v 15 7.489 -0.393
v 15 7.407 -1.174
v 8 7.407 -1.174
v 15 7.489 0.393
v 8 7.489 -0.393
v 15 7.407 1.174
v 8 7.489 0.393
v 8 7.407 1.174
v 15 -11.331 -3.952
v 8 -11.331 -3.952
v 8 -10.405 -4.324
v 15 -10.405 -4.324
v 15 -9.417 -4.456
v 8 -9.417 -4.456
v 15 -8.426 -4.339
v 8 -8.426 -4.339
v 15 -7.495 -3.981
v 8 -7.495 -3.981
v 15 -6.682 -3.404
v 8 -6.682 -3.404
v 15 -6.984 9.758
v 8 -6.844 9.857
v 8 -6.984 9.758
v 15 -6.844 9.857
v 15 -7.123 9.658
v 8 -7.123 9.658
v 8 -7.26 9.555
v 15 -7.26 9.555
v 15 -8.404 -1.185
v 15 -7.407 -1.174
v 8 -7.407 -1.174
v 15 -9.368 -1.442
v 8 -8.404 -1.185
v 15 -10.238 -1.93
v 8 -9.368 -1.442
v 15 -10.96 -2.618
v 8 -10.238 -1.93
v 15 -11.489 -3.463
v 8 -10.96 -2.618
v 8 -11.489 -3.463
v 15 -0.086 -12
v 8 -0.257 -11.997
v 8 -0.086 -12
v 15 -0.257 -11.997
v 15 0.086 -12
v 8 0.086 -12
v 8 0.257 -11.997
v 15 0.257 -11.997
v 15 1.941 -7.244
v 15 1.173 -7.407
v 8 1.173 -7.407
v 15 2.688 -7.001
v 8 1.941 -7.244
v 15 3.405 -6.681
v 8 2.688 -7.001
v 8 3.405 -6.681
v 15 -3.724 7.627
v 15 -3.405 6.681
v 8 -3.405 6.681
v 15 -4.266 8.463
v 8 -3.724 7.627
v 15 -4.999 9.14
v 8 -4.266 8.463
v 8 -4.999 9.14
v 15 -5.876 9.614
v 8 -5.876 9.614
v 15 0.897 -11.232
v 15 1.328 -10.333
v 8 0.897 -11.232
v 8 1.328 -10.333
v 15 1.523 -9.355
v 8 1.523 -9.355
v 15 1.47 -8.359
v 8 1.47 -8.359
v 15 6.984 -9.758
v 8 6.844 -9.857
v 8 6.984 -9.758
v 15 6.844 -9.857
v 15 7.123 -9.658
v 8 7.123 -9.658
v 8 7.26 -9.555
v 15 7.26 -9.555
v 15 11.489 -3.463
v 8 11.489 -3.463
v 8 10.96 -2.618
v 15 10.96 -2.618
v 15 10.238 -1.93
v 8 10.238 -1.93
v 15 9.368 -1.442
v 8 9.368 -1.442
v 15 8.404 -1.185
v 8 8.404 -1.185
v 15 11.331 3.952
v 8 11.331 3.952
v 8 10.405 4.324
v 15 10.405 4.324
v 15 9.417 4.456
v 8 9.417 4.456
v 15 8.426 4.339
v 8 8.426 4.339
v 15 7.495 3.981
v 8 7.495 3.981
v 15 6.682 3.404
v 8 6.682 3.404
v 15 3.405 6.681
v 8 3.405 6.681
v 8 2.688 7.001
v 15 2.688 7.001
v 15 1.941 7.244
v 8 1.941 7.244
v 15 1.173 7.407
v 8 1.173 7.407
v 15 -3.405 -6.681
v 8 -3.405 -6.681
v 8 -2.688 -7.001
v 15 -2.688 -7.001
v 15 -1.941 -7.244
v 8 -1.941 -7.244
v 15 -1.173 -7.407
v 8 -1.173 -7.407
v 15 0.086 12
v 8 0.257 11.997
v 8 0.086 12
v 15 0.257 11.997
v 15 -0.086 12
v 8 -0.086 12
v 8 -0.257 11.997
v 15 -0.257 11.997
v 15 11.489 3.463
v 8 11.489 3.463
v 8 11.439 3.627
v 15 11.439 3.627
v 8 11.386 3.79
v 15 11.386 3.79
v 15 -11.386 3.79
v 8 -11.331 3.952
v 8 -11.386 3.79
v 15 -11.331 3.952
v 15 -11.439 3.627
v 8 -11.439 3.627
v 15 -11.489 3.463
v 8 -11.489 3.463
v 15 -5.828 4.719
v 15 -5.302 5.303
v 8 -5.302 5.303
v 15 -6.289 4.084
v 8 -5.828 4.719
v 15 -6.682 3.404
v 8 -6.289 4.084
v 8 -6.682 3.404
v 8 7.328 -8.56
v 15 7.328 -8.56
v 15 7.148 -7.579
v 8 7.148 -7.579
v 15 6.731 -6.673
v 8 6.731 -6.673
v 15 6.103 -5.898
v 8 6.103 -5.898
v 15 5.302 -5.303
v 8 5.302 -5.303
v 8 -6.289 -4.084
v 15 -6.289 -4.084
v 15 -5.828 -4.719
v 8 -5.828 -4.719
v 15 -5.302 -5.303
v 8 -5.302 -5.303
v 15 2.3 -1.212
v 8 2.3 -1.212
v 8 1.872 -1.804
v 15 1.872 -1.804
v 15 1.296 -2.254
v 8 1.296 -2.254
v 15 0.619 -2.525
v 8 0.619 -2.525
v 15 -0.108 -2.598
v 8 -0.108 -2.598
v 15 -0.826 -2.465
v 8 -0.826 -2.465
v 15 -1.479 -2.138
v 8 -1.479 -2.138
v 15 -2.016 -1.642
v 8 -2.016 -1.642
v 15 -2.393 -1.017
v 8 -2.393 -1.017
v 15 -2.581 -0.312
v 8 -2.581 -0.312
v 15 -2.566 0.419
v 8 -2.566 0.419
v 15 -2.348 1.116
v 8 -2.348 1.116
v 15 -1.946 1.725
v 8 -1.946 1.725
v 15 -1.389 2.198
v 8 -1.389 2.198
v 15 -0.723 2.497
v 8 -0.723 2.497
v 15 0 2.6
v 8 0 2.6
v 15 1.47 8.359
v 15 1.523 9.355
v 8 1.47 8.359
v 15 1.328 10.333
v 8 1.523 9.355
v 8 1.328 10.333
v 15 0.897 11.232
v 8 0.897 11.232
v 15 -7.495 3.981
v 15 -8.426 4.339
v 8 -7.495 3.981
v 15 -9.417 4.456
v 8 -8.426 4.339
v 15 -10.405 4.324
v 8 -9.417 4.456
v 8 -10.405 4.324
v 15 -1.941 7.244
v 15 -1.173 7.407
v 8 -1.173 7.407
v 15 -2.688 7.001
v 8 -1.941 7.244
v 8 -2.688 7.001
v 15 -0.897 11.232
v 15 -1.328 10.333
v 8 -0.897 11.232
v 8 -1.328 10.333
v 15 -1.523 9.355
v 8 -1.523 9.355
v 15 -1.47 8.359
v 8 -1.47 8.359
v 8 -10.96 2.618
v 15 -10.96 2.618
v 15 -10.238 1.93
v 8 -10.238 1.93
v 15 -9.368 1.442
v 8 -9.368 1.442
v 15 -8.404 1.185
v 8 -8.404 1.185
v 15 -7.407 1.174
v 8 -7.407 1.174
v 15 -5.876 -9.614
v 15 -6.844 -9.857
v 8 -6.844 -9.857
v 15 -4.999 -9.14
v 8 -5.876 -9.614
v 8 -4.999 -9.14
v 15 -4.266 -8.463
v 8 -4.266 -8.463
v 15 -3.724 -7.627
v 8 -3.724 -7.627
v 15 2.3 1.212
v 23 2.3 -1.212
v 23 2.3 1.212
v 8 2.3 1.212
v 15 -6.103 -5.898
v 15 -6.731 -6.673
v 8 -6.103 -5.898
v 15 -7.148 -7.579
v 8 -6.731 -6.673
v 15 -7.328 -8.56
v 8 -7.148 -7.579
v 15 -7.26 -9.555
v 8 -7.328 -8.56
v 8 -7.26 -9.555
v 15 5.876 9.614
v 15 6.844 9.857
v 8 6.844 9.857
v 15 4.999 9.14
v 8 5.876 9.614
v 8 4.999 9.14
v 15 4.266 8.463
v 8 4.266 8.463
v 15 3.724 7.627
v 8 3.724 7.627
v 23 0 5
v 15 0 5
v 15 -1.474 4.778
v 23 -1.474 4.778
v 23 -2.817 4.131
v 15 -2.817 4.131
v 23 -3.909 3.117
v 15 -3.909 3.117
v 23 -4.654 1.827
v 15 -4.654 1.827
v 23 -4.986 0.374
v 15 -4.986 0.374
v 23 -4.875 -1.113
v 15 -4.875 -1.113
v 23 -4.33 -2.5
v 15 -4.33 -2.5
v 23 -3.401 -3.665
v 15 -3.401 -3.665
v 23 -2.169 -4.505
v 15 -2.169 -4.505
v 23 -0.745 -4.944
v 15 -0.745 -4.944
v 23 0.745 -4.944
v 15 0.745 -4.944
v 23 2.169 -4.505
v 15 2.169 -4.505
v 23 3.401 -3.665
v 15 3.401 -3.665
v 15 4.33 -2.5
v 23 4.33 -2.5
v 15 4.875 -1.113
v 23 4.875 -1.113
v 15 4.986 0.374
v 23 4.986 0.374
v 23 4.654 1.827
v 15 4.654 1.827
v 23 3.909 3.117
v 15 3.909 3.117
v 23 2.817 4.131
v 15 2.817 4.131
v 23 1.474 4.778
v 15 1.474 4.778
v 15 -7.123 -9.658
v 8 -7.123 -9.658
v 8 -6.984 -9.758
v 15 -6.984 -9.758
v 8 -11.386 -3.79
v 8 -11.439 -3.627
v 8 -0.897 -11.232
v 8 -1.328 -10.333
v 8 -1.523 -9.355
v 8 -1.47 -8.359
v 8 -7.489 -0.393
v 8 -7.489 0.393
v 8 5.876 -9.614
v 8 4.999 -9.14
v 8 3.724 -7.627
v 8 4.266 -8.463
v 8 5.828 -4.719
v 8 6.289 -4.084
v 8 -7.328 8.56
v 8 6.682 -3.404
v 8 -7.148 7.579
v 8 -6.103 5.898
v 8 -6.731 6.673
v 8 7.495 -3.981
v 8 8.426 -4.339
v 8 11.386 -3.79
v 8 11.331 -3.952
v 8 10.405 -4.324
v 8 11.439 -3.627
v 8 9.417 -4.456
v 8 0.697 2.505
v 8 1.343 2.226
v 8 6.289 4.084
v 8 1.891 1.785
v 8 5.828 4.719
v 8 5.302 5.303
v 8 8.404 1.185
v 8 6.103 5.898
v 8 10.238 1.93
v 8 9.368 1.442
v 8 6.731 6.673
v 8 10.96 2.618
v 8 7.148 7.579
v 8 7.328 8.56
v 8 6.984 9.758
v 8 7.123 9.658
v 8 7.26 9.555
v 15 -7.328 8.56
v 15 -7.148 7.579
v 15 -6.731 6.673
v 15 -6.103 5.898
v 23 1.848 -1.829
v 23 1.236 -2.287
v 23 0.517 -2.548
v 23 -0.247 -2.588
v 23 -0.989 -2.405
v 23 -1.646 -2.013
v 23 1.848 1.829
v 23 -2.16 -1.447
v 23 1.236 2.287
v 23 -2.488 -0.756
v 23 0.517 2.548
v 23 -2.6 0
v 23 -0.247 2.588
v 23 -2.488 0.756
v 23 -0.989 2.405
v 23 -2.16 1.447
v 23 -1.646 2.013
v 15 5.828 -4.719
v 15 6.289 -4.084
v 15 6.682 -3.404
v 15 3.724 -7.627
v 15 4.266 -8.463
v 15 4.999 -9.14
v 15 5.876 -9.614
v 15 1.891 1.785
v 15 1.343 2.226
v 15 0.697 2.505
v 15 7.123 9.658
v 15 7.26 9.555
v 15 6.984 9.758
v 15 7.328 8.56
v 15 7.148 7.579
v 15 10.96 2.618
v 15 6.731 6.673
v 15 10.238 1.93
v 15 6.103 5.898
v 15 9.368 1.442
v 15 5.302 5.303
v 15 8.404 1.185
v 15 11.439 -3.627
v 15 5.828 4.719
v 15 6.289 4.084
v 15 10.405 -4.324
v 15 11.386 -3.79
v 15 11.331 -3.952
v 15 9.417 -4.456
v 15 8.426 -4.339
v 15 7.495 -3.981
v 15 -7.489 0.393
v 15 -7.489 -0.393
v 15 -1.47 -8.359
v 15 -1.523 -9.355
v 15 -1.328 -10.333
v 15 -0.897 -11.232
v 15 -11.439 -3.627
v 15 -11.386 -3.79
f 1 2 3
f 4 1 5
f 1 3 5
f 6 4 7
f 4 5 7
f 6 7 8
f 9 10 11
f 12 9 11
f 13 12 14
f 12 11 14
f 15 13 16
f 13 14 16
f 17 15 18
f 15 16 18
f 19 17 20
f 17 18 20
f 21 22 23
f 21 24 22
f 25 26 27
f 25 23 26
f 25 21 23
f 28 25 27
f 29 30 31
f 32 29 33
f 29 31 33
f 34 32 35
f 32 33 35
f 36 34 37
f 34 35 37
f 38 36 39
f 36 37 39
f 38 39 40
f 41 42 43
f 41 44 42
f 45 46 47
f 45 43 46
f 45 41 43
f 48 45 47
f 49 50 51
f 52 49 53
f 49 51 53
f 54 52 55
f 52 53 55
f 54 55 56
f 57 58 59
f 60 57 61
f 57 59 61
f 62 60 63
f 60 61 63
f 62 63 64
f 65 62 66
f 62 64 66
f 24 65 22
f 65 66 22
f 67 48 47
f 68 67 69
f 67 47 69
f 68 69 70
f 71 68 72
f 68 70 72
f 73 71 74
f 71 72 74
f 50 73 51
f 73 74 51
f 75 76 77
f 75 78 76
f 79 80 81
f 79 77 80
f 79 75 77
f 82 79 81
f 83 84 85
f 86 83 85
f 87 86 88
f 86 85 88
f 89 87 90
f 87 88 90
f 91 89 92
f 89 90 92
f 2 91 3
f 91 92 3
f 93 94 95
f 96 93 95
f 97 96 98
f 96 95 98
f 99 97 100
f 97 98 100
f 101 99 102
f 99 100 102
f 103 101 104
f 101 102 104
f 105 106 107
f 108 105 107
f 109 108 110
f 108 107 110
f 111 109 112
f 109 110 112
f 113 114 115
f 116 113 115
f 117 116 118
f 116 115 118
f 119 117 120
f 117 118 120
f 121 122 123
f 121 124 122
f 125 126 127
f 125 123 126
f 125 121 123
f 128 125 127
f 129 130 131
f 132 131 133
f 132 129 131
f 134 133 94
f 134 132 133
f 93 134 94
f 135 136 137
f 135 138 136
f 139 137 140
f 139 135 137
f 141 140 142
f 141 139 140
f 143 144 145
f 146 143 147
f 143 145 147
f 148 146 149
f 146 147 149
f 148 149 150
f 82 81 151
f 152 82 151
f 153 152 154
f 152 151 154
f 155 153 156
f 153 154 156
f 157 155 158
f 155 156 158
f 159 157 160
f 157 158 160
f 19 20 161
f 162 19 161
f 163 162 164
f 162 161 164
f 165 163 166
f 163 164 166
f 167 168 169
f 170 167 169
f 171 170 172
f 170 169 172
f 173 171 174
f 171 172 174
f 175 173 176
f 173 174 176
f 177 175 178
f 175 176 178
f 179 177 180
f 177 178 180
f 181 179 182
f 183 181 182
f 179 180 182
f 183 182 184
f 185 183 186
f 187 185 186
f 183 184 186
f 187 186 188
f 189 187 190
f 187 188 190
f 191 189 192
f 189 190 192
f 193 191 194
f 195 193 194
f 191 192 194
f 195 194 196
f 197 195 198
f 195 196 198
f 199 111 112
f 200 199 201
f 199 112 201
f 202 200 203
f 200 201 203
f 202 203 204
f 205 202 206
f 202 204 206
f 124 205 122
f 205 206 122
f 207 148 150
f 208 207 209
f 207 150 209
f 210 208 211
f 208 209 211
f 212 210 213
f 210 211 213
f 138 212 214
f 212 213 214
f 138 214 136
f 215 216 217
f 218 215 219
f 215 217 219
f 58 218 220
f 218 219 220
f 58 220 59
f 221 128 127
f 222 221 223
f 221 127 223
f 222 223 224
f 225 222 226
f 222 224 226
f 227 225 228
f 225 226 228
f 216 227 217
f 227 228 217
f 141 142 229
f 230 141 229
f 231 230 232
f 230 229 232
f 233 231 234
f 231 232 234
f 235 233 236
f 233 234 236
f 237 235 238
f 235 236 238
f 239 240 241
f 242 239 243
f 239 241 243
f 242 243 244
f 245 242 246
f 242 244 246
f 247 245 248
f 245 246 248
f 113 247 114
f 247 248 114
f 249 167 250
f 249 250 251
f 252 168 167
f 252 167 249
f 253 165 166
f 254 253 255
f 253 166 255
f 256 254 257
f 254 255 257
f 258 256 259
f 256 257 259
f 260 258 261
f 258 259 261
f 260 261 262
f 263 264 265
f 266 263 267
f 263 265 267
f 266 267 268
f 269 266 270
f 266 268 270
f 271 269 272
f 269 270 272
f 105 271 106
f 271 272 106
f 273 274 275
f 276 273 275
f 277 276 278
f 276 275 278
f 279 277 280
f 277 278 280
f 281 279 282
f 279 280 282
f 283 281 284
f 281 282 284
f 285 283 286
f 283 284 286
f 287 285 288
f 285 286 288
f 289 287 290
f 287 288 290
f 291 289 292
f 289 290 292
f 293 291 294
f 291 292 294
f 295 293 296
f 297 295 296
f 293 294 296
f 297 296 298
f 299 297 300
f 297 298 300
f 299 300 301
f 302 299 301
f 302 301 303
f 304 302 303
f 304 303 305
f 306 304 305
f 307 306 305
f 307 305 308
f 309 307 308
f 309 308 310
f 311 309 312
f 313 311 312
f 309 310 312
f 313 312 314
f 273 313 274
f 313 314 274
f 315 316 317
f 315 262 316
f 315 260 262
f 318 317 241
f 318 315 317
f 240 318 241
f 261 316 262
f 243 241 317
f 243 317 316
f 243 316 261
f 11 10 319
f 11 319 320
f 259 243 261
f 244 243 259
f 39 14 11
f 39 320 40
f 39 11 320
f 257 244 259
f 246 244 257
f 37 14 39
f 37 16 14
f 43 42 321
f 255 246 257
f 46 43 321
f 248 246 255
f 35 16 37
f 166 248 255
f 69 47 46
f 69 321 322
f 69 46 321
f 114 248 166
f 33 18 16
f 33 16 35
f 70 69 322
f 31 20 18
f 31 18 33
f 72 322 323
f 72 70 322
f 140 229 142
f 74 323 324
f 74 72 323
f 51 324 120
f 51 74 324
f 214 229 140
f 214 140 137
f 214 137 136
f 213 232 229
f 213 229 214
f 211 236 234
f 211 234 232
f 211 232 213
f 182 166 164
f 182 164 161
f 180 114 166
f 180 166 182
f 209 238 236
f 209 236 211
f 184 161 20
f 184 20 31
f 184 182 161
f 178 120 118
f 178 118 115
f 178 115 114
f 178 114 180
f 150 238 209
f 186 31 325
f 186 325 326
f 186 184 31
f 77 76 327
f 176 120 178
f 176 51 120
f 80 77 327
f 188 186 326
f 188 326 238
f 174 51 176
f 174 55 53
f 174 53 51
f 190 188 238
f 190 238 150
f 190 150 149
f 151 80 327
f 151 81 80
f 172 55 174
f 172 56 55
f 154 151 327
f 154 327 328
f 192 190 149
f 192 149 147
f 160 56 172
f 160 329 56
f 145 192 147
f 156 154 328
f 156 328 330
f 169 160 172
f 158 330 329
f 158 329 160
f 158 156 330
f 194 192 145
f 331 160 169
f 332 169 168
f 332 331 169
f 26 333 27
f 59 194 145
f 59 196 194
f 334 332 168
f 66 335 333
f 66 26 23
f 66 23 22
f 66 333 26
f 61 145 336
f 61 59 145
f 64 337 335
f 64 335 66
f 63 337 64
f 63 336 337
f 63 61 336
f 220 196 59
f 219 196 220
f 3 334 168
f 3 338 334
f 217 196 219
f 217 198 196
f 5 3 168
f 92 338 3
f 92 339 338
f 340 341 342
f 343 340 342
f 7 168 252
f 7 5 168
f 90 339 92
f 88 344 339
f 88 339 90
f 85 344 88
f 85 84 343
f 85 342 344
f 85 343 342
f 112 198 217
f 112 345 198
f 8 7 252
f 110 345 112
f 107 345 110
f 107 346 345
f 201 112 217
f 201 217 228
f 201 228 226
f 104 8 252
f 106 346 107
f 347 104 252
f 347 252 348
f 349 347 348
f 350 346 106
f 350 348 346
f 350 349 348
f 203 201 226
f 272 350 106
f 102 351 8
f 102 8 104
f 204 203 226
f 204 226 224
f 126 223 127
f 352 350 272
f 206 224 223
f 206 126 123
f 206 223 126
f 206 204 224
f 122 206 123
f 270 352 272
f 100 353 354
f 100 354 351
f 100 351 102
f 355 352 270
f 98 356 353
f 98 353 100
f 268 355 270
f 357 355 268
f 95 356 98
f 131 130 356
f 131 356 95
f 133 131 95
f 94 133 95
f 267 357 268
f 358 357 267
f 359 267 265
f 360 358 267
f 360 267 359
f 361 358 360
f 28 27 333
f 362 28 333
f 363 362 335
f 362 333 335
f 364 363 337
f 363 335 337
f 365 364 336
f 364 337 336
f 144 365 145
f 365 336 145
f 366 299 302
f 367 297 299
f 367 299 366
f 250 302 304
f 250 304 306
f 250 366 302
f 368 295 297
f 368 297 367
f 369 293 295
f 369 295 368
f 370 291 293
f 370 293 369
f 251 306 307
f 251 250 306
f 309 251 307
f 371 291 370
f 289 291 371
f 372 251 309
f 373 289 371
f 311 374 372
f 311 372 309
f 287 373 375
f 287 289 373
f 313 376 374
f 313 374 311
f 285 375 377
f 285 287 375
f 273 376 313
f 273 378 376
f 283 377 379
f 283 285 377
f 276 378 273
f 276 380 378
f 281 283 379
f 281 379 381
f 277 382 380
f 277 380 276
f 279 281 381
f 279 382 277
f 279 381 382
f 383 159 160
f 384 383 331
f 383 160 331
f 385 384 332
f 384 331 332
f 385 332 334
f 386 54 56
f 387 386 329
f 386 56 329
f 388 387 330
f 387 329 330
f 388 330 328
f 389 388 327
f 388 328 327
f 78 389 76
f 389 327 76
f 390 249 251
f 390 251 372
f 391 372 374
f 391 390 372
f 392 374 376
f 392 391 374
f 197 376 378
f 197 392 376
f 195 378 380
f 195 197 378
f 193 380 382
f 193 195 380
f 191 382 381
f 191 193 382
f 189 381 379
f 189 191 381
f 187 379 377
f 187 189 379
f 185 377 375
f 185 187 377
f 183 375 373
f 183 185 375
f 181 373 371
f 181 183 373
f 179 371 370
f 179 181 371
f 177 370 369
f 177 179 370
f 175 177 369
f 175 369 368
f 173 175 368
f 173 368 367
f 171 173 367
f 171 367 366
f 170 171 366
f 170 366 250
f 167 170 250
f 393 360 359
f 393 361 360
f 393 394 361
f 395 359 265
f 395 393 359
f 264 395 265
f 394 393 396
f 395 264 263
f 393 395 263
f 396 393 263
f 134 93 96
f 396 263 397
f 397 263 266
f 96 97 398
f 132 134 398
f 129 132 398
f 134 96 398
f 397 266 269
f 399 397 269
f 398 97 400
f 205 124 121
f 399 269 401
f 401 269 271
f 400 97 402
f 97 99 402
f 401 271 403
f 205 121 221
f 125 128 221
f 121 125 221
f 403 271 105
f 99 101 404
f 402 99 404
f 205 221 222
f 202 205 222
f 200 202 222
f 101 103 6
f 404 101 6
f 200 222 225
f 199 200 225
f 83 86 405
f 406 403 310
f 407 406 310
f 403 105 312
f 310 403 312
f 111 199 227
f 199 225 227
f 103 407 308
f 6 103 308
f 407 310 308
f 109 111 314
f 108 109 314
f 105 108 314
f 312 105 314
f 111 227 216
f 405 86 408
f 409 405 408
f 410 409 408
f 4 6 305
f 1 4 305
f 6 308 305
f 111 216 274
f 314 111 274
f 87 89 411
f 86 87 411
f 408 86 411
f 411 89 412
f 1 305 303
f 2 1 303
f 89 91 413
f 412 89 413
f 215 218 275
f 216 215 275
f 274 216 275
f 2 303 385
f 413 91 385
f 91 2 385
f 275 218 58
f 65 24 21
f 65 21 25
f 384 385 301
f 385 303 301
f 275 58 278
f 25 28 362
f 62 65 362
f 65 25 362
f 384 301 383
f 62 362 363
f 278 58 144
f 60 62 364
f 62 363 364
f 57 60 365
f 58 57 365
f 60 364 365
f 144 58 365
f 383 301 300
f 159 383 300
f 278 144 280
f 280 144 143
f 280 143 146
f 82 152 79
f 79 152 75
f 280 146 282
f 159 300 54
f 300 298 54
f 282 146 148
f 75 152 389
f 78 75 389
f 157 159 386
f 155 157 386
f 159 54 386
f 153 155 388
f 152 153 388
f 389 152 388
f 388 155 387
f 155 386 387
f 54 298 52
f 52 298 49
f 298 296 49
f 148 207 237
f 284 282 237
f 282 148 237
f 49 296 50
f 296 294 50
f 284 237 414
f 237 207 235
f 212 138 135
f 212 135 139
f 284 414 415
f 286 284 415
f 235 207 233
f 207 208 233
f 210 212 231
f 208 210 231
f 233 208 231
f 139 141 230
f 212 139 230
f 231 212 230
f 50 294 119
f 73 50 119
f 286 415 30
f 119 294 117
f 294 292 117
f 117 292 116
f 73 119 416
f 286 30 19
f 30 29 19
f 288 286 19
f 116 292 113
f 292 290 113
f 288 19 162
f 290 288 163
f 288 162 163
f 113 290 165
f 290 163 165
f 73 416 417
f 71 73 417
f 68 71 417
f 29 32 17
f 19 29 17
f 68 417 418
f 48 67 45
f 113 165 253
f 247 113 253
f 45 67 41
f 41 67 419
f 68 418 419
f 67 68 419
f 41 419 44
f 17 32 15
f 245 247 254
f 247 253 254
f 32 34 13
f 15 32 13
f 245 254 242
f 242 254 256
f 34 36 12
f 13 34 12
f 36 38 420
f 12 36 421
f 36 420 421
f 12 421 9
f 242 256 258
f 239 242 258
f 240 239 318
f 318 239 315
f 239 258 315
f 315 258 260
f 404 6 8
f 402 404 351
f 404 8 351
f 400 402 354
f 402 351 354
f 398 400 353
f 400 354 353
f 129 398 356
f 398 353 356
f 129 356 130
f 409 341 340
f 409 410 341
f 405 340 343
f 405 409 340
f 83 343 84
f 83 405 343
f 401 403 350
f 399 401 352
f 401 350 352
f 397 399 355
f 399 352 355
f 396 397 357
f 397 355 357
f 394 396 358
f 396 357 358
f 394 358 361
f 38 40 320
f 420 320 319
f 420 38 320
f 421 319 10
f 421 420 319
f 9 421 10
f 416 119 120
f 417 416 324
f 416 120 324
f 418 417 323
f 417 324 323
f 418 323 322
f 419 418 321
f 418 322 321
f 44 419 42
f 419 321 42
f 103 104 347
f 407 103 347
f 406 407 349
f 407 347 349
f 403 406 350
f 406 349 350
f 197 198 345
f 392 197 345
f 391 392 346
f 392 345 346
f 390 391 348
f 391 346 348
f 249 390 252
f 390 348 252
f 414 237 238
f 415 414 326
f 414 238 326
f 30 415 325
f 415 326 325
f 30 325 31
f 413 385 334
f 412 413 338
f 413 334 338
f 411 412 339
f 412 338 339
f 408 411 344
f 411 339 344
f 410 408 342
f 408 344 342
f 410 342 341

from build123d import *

# Parameters (mm, degrees)
BASPROSKE_W         = 15
BASPROSKE_H         = 12
TOOTHCUT_DEPTH      = 23.649503306
TEETHCUTS_COUNT     = 10
TEETHCUTS_ANGLE     = 324
BORSKE_R            = 0.45
BORE_DEPTH          = 50.0000508
SKETCH1_R           = 0.45
CUT_EXTRUDE1_DEPTH  = 15
CUT_EXTRUDE2_DEPTH  = 8
SKETCH6_R           = 5
BOSS_EXTRUDE1_DEPTH = 8


with BuildPart() as part:
    # BasProSke → Base-Revolve (revolve)
    with BuildSketch(Plane(origin=(0, 0, 0), x_dir=(1, 0, 0), z_dir=(0, 1, 0)), mode=Mode.PRIVATE) as base_revolve_sk:
        with Locations((7.5, 6)):
            Rectangle(BASPROSKE_W, BASPROSKE_H)
    revolve(base_revolve_sk.sketch.rotate(Axis((-10, 0, 0), (1, 0, 0)), 180), axis=Axis((-10, 0, 0), (1, 0, 0)))

    # TooCutSke → ToothCut (cut, through all)
    with BuildSketch(Plane(origin=(0, 0, 0), x_dir=(0, 0, -1), z_dir=(1, 0, 0))):
        with BuildLine():
            ThreePointArc((1.173662691, 7.406586048), (0, 7.499), (-1.173662691, 7.406586048))
            ThreePointArc((-1.173662691, 7.406586048), (-1.668191438, 9.834565786), (-3.497907776, 11.50542856))
            ThreePointArc((-3.497907776, 11.50542856), (0, 12.0254), (3.497907776, 11.50542856))
            ThreePointArc((3.497907776, 11.50542856), (1.668191438, 9.834565786), (1.173662691, 7.406586048))
        make_face()
    toothcut = extrude(amount=TOOTHCUT_DEPTH, mode=Mode.SUBTRACT)

    # TeethCuts: ToothCut ×10 about axis
    teethcuts_axis = Axis((-10, 0, 0), (1, 0, 0))
    for i in range(1, TEETHCUTS_COUNT):
        add(toothcut.rotate(teethcuts_axis, i * TEETHCUTS_ANGLE / (TEETHCUTS_COUNT - 1)), mode=Mode.SUBTRACT)

    # BorSke → Bore (cut, symmetric)
    with BuildSketch(Plane(origin=(0, 0, 0), x_dir=(0, 0, -1), z_dir=(1, 0, 0))):
        with Locations(Location((0, 0, 0), (0, 0, 180))):
            Circle(BORSKE_R)
    extrude(amount=BORE_DEPTH, both=True, mode=Mode.SUBTRACT)

    # Sketch1 → Cut-Extrude1 (cut)
    with BuildSketch(Plane.ZY):
        with BuildLine():
            Line((1.212435565, 2.3), (-1.212435565, 2.3))
            ThreePointArc((-1.212435565, 2.3), (-1.343068786, -2.226244873), (2.6, 0))
            ThreePointArc((2.6, 0), (2.226244873, 1.343068786), (1.212435565, 2.3))
        make_face()
        Circle(SKETCH1_R, mode=Mode.SUBTRACT)
    extrude(amount=-CUT_EXTRUDE1_DEPTH, mode=Mode.SUBTRACT)

    # Sketch5 → Cut-Extrude2 (cut)
    with BuildSketch(Plane.ZY):
        with BuildLine():
            ThreePointArc((-7.406763642, 1.172541409), (-9.849931218, 1.456299749), (-11.997250213, 0.256880001))
            ThreePointArc((-11.997250213, 0.256880001), (-12, 0), (-11.997250213, -0.256880001))
            ThreePointArc((-11.997250213, -0.256880001), (-9.849931218, -1.456299749), (-7.406763642, -1.172541409))
            ThreePointArc((-7.406763642, -1.172541409), (-7.131972816, -2.317318441), (-6.681400207, -3.404980509))
            ThreePointArc((-6.681400207, -3.404980509), (-8.824753264, -4.61147306), (-9.856969584, -6.843986457))
            ThreePointArc((-9.856969584, -6.843986457), (-9.708203932, -7.053423028), (-9.554989032, -7.259627029))
            ThreePointArc((-9.554989032, -7.259627029), (-7.112770233, -6.967815552), (-5.302995112, -5.302192362))
            ThreePointArc((-5.302995112, -5.302192362), (-4.407801607, -6.066818441), (-3.403968986, -6.681915604))
            ThreePointArc((-3.403968986, -6.681915604), (-4.428819506, -8.917819898), (-3.9516616, -11.330682707))
            ThreePointArc((-3.9516616, -11.330682707), (-3.708203932, -11.412678196), (-3.463046803, -11.489443278))
            ThreePointArc((-3.463046803, -11.489443278), (-1.658772773, -9.817862641), (-1.173662691, -7.406586048))
            ThreePointArc((-1.173662691, -7.406586048), (0, -7.499), (1.173662691, -7.406586048))
            ThreePointArc((1.173662691, -7.406586048), (1.658772773, -9.817862641), (3.463046803, -11.489443278))
            ThreePointArc((3.463046803, -11.489443278), (3.708203932, -11.412678196), (3.9516616, -11.330682707))
            ThreePointArc((3.9516616, -11.330682707), (4.428819506, -8.917819898), (3.403968986, -6.681915604))
            ThreePointArc((3.403968986, -6.681915604), (4.407801607, -6.066818441), (5.302995112, -5.302192362))
            ThreePointArc((5.302995112, -5.302192362), (7.112770233, -6.967815552), (9.554989032, -7.259627029))
            ThreePointArc((9.554989032, -7.259627029), (9.708203932, -7.053423028), (9.856969584, -6.843986457))
            ThreePointArc((9.856969584, -6.843986457), (8.824753264, -4.61147306), (6.681400207, -3.404980509))
            ThreePointArc((6.681400207, -3.404980509), (7.131972816, -2.317318441), (7.406763642, -1.172541409))
            ThreePointArc((7.406763642, -1.172541409), (9.849931218, -1.456299749), (11.997250213, -0.256880001))
            ThreePointArc((11.997250213, -0.256880001), (12, 0), (11.997250213, 0.256880001))
            ThreePointArc((11.997250213, 0.256880001), (9.849931218, 1.456299749), (7.406763642, 1.172541409))
            ThreePointArc((7.406763642, 1.172541409), (7.131972816, 2.317318441), (6.681400207, 3.404980509))
            ThreePointArc((6.681400207, 3.404980509), (8.824753264, 4.61147306), (9.856969584, 6.843986457))
            ThreePointArc((9.856969584, 6.843986457), (9.708203932, 7.053423028), (9.554989032, 7.259627029))
            ThreePointArc((9.554989032, 7.259627029), (7.112770233, 6.967815552), (5.302995112, 5.302192362))
            ThreePointArc((5.302995112, 5.302192362), (4.407801607, 6.066818441), (3.403968986, 6.681915604))
            ThreePointArc((3.403968986, 6.681915604), (4.428819506, 8.917819898), (3.9516616, 11.330682707))
            ThreePointArc((3.9516616, 11.330682707), (3.708203932, 11.412678196), (3.463046803, 11.489443278))
            ThreePointArc((3.463046803, 11.489443278), (1.658772773, 9.817862641), (1.173662691, 7.406586048))
            ThreePointArc((1.173662691, 7.406586048), (0, 7.499), (-1.173662691, 7.406586048))
            ThreePointArc((-1.173662691, 7.406586048), (-1.658772773, 9.817862641), (-3.463046803, 11.489443278))
            ThreePointArc((-3.463046803, 11.489443278), (-3.708203932, 11.412678196), (-3.9516616, 11.330682707))
            ThreePointArc((-3.9516616, 11.330682707), (-4.428819506, 8.917819898), (-3.403968986, 6.681915604))
            ThreePointArc((-3.403968986, 6.681915604), (-4.407801607, 6.066818441), (-5.302995112, 5.302192362))
            ThreePointArc((-5.302995112, 5.302192362), (-7.112770233, 6.967815552), (-9.554989032, 7.259627029))
            ThreePointArc((-9.554989032, 7.259627029), (-9.708203932, 7.053423028), (-9.856969584, 6.843986457))
            ThreePointArc((-9.856969584, 6.843986457), (-8.824753264, 4.61147306), (-6.681400207, 3.404980509))
            ThreePointArc((-6.681400207, 3.404980509), (-7.131972816, 2.317318441), (-7.406763642, 1.172541409))
        make_face()
    extrude(amount=-CUT_EXTRUDE2_DEPTH, mode=Mode.SUBTRACT)

    # Sketch6 → Boss-Extrude1 (add)
    with BuildSketch(Plane(origin=(15, 0, 0), x_dir=(0, 0, -1), z_dir=(1, 0, 0))):
        with Locations(Location((0, 0, 0), (0, 0, 180))):
            Circle(SKETCH6_R)
        with BuildLine():
            Line((1.212435565, 2.3), (-1.212435565, 2.3))
            ThreePointArc((-1.212435565, 2.3), (0, -2.6), (1.212435565, 2.3))
        make_face(mode=Mode.SUBTRACT)
    extrude(amount=BOSS_EXTRUDE1_DEPTH)


solid = part.part
